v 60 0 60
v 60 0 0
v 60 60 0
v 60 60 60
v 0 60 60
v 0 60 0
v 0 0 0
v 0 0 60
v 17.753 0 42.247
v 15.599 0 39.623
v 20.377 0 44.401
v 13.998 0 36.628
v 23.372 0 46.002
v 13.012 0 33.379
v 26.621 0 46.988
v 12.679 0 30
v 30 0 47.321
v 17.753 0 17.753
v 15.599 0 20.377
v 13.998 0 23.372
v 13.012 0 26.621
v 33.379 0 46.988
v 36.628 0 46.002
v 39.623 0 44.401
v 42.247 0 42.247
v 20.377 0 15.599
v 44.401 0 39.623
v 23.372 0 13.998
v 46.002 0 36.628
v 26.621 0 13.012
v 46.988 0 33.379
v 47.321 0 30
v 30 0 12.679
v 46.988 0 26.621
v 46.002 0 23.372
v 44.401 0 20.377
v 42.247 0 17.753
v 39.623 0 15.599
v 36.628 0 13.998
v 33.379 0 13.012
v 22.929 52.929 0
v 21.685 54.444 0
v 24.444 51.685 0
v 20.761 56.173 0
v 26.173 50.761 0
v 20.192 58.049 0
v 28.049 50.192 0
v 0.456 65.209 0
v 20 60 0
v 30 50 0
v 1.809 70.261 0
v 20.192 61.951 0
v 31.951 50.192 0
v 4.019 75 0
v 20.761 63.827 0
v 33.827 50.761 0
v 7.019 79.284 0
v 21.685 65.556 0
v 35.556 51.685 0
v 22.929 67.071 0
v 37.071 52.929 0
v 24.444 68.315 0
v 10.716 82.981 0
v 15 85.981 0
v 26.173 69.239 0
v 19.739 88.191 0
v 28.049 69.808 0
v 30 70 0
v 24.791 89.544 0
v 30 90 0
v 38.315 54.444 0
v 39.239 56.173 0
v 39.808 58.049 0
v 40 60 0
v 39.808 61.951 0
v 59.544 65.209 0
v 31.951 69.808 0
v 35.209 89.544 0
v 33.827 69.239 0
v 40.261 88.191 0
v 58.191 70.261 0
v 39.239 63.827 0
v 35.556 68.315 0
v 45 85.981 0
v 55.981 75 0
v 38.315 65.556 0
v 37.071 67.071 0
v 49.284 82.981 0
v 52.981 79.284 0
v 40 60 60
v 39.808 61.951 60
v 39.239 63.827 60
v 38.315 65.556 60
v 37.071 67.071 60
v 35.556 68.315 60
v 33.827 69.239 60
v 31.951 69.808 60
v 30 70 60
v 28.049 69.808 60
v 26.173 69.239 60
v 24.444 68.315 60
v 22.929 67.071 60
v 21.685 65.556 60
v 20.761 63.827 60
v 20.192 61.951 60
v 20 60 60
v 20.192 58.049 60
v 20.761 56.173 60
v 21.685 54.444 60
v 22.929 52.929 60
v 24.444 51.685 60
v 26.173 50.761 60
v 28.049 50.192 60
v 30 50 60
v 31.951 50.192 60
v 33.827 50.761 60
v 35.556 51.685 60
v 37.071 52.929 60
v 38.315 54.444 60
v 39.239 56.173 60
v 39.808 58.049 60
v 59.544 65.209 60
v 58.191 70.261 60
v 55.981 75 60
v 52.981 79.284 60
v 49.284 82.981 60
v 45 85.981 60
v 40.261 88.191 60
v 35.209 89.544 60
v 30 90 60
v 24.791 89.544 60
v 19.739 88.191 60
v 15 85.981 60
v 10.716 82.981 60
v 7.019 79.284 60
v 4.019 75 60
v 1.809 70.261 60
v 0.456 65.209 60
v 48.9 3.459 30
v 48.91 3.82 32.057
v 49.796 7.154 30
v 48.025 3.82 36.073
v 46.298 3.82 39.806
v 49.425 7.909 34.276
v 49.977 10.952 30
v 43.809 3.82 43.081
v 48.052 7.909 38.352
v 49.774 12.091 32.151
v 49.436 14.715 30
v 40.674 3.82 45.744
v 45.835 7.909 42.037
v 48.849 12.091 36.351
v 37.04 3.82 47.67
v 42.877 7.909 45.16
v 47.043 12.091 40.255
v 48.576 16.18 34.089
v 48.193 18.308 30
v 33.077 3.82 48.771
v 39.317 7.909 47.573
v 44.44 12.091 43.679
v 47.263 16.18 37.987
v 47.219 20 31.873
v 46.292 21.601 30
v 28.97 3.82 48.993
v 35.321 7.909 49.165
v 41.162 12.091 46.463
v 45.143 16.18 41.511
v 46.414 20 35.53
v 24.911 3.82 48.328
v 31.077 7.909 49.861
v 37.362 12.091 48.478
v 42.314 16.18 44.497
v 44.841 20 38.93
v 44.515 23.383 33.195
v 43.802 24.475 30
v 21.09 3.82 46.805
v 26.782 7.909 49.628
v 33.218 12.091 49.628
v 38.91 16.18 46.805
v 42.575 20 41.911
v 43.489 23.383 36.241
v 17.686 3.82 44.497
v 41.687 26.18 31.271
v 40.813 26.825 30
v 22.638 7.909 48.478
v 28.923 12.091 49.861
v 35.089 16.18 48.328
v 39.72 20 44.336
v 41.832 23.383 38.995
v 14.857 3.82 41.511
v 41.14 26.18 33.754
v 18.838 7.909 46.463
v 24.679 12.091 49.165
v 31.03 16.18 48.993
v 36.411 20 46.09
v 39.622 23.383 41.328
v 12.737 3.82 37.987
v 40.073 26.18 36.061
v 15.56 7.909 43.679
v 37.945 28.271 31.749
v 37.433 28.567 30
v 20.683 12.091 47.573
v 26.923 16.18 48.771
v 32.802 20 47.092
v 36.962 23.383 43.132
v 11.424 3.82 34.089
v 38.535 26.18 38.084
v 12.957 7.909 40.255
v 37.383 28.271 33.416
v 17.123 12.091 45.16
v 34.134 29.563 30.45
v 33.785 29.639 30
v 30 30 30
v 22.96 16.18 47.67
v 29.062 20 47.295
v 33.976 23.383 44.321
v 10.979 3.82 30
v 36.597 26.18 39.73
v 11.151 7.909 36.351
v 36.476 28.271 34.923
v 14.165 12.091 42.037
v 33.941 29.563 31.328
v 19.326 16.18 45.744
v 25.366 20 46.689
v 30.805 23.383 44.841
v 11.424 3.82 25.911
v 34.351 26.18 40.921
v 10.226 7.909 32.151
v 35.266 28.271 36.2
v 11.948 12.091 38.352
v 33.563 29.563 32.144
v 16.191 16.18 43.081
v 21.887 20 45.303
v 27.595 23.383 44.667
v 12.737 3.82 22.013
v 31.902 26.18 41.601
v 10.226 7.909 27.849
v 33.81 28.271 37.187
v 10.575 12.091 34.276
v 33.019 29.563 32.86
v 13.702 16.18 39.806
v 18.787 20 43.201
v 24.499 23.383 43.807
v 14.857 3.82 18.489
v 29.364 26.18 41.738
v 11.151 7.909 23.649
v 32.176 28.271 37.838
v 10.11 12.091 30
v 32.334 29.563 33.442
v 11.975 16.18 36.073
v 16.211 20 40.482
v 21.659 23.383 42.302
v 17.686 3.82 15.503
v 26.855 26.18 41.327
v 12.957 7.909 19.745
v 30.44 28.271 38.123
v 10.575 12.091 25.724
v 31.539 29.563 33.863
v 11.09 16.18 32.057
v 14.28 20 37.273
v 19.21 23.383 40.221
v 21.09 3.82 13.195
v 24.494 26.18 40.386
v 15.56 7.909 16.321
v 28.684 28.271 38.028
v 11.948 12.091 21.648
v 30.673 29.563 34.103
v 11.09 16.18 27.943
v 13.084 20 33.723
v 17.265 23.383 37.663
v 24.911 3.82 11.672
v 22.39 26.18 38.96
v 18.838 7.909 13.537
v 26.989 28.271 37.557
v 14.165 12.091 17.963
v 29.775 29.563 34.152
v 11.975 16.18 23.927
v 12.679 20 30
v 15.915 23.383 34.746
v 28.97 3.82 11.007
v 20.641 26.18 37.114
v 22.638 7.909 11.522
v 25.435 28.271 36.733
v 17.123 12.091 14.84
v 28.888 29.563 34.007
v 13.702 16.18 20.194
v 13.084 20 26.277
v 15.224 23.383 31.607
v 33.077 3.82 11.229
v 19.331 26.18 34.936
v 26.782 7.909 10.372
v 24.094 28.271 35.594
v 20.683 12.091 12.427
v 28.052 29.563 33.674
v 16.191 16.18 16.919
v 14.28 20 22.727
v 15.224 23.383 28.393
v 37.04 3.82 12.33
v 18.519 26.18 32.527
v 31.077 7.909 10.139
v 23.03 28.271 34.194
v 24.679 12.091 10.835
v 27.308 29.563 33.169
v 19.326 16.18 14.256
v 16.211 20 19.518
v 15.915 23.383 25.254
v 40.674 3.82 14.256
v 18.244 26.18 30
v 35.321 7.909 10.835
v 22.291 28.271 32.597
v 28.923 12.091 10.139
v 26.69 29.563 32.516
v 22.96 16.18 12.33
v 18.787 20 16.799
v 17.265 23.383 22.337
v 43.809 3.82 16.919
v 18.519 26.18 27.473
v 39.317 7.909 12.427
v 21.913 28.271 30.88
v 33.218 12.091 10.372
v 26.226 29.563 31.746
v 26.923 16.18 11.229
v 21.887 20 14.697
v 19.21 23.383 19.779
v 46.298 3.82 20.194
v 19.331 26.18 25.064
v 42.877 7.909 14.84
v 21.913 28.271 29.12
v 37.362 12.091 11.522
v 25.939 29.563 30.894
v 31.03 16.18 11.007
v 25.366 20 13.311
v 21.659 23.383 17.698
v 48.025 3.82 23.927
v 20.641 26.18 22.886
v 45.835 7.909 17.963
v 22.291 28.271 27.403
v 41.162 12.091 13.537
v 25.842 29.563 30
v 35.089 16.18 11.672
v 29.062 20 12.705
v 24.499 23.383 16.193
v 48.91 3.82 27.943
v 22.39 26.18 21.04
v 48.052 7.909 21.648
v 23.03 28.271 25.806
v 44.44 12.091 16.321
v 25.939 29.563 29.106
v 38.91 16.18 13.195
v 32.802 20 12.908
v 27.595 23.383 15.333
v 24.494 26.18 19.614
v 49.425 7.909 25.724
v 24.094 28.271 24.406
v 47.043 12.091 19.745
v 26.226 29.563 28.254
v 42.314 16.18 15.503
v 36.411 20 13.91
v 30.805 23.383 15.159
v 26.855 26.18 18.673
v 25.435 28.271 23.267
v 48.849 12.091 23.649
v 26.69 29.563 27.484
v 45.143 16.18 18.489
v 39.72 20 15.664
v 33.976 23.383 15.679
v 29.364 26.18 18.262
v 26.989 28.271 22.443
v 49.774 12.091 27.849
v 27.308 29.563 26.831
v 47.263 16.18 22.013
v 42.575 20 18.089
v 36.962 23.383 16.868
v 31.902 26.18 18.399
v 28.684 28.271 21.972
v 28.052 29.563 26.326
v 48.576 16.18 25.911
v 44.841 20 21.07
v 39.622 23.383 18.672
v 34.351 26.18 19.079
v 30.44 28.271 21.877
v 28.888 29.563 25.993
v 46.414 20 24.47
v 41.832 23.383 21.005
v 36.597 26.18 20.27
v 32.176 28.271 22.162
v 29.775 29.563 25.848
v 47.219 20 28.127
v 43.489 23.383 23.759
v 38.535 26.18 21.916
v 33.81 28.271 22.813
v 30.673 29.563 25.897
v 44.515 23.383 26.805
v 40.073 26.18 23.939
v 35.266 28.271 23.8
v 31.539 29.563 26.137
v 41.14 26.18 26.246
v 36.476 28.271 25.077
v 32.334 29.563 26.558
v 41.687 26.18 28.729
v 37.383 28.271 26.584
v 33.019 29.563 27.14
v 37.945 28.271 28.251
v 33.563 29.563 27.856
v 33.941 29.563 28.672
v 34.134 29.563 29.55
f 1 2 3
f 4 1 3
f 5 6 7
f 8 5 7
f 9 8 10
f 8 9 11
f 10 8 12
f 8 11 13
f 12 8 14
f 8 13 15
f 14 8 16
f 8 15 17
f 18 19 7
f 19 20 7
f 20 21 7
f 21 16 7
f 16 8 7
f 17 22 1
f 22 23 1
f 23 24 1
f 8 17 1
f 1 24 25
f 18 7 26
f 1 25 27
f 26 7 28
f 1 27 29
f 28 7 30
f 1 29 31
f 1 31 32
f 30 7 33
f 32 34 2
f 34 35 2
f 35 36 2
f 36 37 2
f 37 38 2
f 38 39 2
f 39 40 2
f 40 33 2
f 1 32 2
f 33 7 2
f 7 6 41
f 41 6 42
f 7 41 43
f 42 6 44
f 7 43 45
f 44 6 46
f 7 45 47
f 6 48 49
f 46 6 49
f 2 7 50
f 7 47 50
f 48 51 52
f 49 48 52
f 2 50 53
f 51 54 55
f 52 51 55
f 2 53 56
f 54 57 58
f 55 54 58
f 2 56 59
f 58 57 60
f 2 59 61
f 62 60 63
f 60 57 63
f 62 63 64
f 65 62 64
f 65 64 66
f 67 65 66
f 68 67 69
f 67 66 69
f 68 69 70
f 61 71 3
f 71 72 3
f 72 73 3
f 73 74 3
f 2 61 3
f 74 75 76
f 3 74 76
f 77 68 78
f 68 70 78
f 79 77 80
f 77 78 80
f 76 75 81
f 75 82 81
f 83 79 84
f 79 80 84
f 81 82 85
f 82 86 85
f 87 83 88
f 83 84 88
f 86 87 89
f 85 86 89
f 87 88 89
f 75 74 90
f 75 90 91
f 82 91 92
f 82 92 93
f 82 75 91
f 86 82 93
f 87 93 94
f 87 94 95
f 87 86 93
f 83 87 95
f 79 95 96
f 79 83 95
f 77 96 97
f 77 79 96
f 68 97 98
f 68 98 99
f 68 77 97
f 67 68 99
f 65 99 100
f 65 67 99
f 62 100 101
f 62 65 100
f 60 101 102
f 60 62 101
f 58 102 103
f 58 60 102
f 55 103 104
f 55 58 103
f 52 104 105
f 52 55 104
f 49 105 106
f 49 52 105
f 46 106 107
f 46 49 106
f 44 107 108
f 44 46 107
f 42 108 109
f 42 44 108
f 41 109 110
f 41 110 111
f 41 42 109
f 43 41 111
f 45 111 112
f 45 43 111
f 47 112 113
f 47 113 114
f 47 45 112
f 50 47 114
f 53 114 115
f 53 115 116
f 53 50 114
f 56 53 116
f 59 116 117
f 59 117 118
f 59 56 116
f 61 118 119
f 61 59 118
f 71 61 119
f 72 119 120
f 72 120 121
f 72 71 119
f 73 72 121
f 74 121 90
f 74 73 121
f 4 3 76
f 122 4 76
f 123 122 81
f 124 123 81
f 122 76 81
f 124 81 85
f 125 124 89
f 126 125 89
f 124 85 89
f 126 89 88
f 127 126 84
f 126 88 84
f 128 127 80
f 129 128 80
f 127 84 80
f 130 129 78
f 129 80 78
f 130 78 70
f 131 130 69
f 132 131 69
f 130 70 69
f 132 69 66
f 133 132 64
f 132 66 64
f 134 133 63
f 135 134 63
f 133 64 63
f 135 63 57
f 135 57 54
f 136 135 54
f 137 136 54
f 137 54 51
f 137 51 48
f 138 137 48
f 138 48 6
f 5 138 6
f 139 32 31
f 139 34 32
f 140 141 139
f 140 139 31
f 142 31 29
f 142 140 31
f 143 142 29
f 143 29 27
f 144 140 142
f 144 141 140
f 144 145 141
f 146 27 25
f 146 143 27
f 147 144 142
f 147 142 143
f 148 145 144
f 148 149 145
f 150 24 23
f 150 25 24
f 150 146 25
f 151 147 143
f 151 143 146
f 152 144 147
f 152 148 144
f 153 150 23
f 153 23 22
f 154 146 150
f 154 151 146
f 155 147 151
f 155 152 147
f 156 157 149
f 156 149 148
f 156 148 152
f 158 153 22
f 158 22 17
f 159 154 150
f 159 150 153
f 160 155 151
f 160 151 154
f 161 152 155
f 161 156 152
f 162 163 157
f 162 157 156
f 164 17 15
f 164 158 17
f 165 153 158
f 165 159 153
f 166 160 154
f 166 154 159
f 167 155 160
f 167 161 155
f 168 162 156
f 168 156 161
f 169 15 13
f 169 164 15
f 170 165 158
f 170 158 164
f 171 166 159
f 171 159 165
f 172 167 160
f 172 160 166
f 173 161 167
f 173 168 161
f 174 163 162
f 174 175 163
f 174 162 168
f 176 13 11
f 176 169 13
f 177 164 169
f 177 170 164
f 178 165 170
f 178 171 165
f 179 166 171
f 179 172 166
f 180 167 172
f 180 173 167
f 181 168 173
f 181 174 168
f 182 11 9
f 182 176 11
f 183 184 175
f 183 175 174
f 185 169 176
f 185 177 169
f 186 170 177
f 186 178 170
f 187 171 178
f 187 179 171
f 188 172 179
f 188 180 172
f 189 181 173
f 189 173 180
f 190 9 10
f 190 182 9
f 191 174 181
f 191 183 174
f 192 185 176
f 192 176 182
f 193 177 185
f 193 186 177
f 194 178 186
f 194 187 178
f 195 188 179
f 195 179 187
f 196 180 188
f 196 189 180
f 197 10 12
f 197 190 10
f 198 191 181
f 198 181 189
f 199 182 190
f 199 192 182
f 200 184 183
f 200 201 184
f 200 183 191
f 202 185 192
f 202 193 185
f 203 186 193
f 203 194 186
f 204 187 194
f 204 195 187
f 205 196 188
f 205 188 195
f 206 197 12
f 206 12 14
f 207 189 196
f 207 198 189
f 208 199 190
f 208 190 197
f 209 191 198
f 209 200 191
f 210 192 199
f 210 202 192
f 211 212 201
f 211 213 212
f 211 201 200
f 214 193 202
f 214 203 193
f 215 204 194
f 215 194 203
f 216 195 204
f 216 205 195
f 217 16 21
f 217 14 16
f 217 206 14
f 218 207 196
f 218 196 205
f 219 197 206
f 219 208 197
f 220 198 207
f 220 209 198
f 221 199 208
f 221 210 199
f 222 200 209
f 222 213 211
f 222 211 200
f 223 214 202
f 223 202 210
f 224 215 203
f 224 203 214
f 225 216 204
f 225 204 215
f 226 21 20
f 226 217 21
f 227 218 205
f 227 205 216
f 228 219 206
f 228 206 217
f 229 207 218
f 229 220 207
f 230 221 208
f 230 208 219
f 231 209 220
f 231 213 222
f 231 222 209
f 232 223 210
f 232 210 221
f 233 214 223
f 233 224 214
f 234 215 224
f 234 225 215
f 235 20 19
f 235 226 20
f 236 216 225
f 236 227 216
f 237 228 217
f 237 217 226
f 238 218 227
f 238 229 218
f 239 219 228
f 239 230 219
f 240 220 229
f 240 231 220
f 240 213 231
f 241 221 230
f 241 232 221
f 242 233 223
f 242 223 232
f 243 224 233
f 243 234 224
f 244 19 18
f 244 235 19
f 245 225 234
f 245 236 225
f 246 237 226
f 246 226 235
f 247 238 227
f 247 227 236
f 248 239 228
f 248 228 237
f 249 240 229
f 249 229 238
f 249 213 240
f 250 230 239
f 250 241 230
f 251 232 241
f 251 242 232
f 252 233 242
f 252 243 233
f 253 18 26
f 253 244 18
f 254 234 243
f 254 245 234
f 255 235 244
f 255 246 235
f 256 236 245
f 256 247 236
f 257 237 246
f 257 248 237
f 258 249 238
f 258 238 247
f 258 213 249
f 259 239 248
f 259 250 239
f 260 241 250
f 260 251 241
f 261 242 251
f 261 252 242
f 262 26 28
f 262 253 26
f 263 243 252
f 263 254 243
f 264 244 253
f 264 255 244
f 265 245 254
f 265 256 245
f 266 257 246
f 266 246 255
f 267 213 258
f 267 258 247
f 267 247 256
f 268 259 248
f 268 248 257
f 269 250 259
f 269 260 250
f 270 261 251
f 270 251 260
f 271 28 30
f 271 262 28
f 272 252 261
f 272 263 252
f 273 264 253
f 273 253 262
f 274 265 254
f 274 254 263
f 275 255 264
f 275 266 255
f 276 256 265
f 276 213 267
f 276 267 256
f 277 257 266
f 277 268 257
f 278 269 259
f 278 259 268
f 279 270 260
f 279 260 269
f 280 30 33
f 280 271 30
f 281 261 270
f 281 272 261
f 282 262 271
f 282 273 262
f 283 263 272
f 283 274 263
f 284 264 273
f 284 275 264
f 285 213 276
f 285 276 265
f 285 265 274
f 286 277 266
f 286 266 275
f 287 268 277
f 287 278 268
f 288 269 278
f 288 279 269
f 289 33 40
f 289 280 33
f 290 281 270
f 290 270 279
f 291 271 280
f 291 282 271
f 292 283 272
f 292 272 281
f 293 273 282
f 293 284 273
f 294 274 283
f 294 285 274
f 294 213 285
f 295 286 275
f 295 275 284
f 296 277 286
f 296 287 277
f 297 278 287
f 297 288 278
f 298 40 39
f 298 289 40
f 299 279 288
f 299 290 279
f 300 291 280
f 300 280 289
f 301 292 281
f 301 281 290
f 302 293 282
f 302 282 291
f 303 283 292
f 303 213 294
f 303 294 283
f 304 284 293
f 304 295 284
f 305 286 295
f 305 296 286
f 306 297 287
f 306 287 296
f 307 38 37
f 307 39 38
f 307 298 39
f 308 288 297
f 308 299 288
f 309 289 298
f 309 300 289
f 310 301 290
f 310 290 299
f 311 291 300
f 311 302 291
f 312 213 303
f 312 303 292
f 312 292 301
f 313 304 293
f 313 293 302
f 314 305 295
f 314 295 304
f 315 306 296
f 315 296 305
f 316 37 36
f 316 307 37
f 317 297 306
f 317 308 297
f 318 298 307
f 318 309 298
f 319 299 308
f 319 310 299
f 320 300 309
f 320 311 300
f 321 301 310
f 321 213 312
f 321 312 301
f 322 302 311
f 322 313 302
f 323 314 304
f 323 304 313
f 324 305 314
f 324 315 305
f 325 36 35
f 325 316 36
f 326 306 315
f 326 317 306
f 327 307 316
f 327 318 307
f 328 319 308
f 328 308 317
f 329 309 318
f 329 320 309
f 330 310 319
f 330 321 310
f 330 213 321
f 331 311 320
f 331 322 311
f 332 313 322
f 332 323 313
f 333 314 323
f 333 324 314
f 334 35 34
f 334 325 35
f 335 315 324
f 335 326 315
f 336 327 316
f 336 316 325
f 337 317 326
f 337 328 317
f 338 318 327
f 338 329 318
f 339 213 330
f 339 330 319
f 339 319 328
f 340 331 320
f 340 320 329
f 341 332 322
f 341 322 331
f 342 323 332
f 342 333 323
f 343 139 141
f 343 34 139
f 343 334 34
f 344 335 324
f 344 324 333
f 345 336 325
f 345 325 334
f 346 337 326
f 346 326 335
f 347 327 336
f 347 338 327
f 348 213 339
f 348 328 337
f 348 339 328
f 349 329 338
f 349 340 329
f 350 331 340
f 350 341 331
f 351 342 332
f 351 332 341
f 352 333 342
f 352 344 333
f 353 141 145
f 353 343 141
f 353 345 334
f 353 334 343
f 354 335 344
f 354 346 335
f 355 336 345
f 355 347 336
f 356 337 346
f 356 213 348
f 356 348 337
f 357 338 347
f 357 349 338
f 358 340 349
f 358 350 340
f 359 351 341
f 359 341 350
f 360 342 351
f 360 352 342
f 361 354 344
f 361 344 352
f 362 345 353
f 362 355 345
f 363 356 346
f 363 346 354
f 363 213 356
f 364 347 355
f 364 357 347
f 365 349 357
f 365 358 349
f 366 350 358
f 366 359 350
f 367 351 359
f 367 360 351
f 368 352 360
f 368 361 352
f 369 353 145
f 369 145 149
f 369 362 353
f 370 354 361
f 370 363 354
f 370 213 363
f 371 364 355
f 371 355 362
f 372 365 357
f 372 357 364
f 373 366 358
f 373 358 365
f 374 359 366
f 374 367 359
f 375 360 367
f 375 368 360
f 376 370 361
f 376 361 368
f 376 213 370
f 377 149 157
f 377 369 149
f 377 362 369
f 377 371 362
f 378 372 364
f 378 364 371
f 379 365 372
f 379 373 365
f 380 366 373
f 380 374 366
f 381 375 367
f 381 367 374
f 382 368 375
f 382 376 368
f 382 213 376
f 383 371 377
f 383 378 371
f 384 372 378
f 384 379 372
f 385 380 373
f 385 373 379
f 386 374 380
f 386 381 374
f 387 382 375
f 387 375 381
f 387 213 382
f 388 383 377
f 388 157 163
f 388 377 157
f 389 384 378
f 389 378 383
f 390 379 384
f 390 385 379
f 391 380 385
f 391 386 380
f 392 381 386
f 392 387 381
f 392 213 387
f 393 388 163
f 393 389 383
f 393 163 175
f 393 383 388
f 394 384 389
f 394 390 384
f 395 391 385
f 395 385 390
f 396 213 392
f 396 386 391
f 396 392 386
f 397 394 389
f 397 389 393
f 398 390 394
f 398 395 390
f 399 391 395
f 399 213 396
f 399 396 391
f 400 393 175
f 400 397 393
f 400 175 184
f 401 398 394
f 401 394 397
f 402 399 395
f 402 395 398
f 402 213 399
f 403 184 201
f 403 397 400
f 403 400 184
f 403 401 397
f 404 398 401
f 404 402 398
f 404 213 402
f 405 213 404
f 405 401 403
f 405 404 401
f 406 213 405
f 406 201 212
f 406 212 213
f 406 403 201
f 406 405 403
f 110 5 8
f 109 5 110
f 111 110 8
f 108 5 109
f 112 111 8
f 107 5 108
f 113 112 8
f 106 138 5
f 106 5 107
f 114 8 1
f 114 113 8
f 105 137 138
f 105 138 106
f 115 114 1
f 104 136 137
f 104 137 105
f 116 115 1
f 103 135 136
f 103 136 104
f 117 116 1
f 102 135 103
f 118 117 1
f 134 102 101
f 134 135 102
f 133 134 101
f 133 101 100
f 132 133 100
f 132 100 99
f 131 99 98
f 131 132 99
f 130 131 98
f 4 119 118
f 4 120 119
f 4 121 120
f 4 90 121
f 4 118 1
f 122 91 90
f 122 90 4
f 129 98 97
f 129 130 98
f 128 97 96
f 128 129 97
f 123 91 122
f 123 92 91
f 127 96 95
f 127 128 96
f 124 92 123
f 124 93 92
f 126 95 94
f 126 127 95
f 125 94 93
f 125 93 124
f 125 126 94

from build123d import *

# Parameters (mm, degrees)
SKETCH1_R           = 10
BOSS_EXTRUDE1_DEPTH = 60


with BuildPart() as part:
    # Sketch1 → Boss-Extrude1 (new body)
    with BuildSketch(Plane.XY):
        with BuildLine():
            Line((0, 0), (60, 0))
            Line((60, 0), (60, 60))
            ThreePointArc((60, 60), (30, 90), (0, 60))
            Line((0, 60), (0, 0))
        make_face()
        with Locations((30, 60)):
            Circle(SKETCH1_R, mode=Mode.SUBTRACT)
    extrude(amount=BOSS_EXTRUDE1_DEPTH)

    # Sketch4 → Cut-Revolve1 (revolve, cut)
    with BuildSketch(Plane.XY.offset(30)):
        with BuildLine():
            Line((30, 30), (30, -10))
            ThreePointArc((30, -10), (50, 10), (30, 30))
        make_face()
    revolve(axis=Axis((30, 30, 30), (0, -1, 0)), mode=Mode.SUBTRACT)


solid = part.part
